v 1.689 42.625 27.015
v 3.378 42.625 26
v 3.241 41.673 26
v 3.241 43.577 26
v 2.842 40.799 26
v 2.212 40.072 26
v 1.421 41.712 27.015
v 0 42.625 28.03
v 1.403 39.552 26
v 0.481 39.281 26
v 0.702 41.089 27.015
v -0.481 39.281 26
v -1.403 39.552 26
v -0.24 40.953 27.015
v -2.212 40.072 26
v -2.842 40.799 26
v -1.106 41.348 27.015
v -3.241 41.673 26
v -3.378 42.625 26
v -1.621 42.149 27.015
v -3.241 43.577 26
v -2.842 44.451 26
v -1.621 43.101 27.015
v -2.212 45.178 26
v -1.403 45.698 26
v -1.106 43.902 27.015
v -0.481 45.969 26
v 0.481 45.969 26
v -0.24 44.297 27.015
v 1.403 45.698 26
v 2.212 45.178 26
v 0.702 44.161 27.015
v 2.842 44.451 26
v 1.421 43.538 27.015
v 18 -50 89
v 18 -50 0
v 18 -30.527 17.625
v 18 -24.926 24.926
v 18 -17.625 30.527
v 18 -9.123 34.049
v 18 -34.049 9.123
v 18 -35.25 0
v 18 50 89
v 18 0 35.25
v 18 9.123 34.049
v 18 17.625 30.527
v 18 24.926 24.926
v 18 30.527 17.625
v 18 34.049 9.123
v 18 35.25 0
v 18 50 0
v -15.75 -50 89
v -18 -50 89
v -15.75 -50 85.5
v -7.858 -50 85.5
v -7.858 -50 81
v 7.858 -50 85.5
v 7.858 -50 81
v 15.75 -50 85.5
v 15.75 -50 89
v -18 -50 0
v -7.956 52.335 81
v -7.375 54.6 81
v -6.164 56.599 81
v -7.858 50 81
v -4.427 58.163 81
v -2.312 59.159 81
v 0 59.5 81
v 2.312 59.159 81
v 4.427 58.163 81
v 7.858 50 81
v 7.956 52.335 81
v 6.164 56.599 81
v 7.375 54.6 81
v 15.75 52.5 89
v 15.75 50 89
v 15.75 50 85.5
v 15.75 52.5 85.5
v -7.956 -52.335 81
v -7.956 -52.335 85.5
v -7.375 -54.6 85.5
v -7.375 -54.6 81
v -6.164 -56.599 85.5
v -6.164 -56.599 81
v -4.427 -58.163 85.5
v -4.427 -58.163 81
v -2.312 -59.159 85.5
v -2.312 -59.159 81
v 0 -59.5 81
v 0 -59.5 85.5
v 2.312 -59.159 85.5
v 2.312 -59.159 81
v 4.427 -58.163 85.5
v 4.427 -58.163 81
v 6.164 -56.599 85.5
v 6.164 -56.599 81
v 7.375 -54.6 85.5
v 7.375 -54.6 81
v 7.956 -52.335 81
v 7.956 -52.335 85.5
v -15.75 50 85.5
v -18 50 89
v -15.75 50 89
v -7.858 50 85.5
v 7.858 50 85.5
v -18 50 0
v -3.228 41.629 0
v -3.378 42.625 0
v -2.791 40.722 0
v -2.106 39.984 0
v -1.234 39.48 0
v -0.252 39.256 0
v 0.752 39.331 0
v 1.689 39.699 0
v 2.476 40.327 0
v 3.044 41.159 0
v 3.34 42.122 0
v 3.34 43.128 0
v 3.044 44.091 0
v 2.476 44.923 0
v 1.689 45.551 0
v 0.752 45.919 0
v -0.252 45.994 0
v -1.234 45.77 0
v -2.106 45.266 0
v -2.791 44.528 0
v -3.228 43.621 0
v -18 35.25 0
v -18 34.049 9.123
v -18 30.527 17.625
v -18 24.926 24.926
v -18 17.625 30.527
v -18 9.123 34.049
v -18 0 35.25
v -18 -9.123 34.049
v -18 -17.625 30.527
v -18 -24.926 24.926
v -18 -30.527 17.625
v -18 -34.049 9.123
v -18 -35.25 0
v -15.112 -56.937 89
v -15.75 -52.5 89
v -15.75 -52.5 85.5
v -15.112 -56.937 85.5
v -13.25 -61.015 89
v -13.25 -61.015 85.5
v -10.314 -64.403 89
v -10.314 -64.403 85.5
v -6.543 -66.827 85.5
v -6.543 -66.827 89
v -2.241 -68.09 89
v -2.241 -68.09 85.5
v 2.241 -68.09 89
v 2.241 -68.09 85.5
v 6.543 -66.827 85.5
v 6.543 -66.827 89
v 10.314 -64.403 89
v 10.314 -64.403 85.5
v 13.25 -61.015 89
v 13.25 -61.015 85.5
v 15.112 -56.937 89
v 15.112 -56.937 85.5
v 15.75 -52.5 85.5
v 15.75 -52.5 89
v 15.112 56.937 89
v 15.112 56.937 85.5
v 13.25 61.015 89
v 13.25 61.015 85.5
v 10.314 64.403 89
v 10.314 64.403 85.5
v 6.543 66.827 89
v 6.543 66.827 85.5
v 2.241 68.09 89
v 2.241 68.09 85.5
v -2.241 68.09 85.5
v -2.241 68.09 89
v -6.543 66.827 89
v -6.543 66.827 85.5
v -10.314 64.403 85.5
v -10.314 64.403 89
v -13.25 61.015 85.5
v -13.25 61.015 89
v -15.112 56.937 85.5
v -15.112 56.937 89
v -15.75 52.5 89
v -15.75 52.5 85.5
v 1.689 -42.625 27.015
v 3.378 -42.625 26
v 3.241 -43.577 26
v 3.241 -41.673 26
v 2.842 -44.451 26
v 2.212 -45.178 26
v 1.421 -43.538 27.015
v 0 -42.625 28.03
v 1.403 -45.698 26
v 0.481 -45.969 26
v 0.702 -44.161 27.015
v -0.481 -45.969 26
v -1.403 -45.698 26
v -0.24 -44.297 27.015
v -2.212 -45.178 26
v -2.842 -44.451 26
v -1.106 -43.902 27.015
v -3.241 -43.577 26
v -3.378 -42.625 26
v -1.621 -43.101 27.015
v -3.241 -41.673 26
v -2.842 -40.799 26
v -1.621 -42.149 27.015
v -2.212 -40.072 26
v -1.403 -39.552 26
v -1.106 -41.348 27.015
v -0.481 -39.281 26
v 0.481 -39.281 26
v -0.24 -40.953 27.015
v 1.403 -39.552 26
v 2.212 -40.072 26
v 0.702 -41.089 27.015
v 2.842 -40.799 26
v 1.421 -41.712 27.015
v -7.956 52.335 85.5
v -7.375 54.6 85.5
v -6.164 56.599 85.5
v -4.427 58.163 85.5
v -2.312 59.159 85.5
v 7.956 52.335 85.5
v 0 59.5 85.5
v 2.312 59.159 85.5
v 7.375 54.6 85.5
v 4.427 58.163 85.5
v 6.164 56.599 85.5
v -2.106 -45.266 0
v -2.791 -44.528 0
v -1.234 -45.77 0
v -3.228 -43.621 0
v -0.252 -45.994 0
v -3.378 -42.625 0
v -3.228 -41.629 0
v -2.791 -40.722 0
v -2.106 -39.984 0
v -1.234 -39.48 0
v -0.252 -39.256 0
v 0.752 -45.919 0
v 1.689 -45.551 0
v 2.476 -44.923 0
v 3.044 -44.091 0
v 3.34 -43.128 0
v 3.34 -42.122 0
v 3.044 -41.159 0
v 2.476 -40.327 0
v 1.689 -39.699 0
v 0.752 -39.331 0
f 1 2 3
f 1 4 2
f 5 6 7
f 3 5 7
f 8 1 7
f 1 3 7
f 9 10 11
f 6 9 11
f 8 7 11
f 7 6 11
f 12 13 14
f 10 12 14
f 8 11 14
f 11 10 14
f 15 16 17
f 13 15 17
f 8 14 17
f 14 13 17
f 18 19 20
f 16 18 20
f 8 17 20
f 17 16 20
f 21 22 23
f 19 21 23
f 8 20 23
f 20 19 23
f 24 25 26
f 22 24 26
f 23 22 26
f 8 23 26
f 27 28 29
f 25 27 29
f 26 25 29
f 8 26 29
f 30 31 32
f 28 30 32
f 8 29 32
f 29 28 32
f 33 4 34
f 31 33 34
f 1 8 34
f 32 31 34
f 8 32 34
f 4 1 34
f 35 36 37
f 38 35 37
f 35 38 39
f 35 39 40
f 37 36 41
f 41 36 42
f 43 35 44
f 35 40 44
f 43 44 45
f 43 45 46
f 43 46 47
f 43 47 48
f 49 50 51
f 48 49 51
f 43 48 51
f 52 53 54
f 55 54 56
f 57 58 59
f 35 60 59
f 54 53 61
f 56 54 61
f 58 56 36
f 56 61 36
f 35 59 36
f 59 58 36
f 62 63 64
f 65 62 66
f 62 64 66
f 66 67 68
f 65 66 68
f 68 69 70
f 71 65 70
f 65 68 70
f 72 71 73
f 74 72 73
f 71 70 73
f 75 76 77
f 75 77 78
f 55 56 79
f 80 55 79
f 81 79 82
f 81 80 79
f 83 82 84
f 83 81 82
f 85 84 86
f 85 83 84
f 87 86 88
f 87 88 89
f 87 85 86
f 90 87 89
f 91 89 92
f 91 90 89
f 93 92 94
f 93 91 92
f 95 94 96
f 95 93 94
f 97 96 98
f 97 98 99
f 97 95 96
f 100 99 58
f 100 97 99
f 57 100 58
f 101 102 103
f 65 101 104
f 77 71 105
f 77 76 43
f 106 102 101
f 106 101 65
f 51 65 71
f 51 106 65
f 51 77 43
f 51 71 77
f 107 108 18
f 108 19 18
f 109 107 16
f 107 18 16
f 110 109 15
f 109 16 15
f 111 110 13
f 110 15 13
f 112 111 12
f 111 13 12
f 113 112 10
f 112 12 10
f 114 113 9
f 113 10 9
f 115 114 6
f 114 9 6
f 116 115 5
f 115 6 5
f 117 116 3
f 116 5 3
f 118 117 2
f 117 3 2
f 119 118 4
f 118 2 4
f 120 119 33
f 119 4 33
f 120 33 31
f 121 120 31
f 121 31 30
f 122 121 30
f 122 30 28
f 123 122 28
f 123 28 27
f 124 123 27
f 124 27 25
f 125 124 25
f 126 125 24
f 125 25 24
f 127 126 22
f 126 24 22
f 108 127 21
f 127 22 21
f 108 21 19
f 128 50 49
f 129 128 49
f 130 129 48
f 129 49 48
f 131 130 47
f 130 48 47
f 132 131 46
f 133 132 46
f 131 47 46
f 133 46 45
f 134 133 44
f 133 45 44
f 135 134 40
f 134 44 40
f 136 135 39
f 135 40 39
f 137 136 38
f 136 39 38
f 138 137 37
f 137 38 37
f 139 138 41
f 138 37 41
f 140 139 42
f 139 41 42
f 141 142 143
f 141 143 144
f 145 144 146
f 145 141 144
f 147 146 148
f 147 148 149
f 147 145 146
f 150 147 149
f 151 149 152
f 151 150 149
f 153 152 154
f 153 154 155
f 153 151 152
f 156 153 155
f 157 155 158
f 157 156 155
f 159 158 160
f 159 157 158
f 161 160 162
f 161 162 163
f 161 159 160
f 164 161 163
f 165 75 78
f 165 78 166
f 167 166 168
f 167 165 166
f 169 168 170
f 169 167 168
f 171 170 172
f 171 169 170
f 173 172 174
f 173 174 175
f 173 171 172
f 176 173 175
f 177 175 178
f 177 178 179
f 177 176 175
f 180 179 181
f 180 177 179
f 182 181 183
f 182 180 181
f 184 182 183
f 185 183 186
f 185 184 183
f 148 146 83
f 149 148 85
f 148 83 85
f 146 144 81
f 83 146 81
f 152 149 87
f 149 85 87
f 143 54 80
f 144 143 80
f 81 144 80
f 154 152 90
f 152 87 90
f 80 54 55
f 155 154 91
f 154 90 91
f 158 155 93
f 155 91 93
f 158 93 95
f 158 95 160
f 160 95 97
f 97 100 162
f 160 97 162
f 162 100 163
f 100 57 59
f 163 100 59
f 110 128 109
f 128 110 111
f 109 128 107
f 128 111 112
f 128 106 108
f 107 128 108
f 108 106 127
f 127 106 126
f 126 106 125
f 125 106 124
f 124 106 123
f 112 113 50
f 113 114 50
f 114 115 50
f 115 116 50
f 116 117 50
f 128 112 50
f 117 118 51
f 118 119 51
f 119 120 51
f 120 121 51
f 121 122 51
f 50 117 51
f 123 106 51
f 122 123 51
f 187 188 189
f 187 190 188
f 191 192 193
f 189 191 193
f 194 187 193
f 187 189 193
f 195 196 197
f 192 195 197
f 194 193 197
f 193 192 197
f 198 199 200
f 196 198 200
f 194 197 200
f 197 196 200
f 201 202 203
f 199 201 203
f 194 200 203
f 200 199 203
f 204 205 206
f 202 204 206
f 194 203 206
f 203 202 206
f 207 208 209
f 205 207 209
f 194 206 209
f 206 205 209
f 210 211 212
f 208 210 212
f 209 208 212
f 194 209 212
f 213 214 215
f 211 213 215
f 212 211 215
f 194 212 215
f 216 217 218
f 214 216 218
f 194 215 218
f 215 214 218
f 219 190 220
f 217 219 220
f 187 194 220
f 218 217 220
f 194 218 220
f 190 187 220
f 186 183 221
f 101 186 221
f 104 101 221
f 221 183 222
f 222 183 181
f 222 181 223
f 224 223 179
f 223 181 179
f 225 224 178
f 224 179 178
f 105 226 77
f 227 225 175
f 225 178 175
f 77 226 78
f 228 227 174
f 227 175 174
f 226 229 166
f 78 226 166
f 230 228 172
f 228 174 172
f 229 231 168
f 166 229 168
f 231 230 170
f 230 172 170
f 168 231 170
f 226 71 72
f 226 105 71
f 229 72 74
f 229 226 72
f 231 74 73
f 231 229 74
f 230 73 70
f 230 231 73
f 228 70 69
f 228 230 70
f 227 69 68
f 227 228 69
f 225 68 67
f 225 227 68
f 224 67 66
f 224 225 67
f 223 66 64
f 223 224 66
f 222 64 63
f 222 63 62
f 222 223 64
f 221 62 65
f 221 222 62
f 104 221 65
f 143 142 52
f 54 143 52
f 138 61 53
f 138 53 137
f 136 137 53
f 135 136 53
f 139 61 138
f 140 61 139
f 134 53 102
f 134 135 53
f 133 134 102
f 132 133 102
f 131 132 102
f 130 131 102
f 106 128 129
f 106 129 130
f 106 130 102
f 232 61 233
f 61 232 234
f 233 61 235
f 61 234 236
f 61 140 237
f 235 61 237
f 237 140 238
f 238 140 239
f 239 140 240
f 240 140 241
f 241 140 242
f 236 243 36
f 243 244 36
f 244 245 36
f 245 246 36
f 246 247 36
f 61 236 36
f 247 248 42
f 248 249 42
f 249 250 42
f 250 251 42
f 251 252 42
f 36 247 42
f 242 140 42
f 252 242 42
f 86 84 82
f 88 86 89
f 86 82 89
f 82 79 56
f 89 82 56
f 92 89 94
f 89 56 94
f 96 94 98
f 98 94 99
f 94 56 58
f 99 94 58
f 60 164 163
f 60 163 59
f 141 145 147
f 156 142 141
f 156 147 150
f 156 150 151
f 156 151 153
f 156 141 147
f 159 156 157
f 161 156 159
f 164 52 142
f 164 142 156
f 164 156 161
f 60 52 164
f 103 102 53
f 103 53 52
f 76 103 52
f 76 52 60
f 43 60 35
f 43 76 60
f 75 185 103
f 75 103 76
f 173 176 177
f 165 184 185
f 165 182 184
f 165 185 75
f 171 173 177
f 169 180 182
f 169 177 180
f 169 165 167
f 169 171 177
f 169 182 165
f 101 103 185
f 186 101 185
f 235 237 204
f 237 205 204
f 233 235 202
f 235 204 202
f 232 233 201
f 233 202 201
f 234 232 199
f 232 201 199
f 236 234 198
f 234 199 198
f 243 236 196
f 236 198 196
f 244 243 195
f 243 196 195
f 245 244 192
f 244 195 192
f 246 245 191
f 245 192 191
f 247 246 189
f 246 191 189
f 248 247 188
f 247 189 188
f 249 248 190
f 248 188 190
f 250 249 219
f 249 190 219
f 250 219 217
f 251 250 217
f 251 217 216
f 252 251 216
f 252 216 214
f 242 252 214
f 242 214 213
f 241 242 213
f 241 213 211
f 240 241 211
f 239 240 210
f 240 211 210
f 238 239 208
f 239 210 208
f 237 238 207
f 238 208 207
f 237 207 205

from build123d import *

# Parameters (mm, degrees)
F0_W      = 36
F0_H      = 100
F1_DEPTH  = 89
F2_R      = 10.25
F3_DEPTH  = 25
F4_R      = 35.25
F5_DEPTH  = 27.5
F6_R      = 15.75
F7_DEPTH  = 3.5
F8_W      = 31.5
F8_H      = 105
F9_DEPTH  = 3.5
F10_R     = 8
F11_DEPTH = 8
F13_D     = 6.7564
F13_DEPTH = 26
F13_TIP   = 2.0298273432
F15_D     = 6.7564
F15_DEPTH = 26
F15_TIP   = 2.0298273432


with BuildPart() as f1:
    # F0 (on Top) → F1 (new body)
    with BuildSketch(Plane.XY):
        Rectangle(F0_W, F0_H)
    extrude(amount=F1_DEPTH)

    # F2 (on Front) → F3 (cut, symmetric)
    with BuildSketch(Plane.XZ):
        Circle(F2_R)
    extrude(amount=F3_DEPTH, both=True, mode=Mode.SUBTRACT)

    # F4 (on Right) → F5 (cut, symmetric)
    with BuildSketch(Plane.YZ):
        Circle(F4_R)
    extrude(amount=F5_DEPTH, both=True, mode=Mode.SUBTRACT)

    # F6 (on face) → F7 (join)
    with BuildSketch(Plane.XY.offset(89)):
        with Locations((0, 52.5)):
            Circle(F6_R)
        with Locations((0, -52.5)):
            Circle(F6_R)
    extrude(amount=-F7_DEPTH)

    # F8 (on face) → F9 (join)
    with BuildSketch(Plane.XY.offset(89)):
        Rectangle(F8_W, F8_H)
    extrude(amount=-F9_DEPTH)

    # F10 (on face) → F11 (join)
    with BuildSketch(Plane.XY.offset(89)):
        with Locations((0, 51.5)):
            Circle(F10_R)
        with Locations((0, -51.5)):
            Circle(F10_R)
    extrude(amount=-F11_DEPTH)

    # F13
    with Locations(Plane(origin=(0, 0, 0), x_dir=(1, 0, 0), z_dir=(0, 0, -1))):
        with Locations((0, 42.625)):
            Hole(F13_D / 2, depth=F13_DEPTH)
            with Locations((0, 0, -(F13_DEPTH + F13_TIP / 2))):  # 118° drill point
                Cone(0, F13_D / 2, F13_TIP, mode=Mode.SUBTRACT)

    # F15
    with Locations(Plane(origin=(0, 0, 0), x_dir=(1, 0, 0), z_dir=(0, 0, -1))):
        with Locations((0, -42.625)):
            Hole(F15_D / 2, depth=F15_DEPTH)
            with Locations((0, 0, -(F15_DEPTH + F15_TIP / 2))):  # 118° drill point
                Cone(0, F15_D / 2, F15_TIP, mode=Mode.SUBTRACT)


solid = f1.part
